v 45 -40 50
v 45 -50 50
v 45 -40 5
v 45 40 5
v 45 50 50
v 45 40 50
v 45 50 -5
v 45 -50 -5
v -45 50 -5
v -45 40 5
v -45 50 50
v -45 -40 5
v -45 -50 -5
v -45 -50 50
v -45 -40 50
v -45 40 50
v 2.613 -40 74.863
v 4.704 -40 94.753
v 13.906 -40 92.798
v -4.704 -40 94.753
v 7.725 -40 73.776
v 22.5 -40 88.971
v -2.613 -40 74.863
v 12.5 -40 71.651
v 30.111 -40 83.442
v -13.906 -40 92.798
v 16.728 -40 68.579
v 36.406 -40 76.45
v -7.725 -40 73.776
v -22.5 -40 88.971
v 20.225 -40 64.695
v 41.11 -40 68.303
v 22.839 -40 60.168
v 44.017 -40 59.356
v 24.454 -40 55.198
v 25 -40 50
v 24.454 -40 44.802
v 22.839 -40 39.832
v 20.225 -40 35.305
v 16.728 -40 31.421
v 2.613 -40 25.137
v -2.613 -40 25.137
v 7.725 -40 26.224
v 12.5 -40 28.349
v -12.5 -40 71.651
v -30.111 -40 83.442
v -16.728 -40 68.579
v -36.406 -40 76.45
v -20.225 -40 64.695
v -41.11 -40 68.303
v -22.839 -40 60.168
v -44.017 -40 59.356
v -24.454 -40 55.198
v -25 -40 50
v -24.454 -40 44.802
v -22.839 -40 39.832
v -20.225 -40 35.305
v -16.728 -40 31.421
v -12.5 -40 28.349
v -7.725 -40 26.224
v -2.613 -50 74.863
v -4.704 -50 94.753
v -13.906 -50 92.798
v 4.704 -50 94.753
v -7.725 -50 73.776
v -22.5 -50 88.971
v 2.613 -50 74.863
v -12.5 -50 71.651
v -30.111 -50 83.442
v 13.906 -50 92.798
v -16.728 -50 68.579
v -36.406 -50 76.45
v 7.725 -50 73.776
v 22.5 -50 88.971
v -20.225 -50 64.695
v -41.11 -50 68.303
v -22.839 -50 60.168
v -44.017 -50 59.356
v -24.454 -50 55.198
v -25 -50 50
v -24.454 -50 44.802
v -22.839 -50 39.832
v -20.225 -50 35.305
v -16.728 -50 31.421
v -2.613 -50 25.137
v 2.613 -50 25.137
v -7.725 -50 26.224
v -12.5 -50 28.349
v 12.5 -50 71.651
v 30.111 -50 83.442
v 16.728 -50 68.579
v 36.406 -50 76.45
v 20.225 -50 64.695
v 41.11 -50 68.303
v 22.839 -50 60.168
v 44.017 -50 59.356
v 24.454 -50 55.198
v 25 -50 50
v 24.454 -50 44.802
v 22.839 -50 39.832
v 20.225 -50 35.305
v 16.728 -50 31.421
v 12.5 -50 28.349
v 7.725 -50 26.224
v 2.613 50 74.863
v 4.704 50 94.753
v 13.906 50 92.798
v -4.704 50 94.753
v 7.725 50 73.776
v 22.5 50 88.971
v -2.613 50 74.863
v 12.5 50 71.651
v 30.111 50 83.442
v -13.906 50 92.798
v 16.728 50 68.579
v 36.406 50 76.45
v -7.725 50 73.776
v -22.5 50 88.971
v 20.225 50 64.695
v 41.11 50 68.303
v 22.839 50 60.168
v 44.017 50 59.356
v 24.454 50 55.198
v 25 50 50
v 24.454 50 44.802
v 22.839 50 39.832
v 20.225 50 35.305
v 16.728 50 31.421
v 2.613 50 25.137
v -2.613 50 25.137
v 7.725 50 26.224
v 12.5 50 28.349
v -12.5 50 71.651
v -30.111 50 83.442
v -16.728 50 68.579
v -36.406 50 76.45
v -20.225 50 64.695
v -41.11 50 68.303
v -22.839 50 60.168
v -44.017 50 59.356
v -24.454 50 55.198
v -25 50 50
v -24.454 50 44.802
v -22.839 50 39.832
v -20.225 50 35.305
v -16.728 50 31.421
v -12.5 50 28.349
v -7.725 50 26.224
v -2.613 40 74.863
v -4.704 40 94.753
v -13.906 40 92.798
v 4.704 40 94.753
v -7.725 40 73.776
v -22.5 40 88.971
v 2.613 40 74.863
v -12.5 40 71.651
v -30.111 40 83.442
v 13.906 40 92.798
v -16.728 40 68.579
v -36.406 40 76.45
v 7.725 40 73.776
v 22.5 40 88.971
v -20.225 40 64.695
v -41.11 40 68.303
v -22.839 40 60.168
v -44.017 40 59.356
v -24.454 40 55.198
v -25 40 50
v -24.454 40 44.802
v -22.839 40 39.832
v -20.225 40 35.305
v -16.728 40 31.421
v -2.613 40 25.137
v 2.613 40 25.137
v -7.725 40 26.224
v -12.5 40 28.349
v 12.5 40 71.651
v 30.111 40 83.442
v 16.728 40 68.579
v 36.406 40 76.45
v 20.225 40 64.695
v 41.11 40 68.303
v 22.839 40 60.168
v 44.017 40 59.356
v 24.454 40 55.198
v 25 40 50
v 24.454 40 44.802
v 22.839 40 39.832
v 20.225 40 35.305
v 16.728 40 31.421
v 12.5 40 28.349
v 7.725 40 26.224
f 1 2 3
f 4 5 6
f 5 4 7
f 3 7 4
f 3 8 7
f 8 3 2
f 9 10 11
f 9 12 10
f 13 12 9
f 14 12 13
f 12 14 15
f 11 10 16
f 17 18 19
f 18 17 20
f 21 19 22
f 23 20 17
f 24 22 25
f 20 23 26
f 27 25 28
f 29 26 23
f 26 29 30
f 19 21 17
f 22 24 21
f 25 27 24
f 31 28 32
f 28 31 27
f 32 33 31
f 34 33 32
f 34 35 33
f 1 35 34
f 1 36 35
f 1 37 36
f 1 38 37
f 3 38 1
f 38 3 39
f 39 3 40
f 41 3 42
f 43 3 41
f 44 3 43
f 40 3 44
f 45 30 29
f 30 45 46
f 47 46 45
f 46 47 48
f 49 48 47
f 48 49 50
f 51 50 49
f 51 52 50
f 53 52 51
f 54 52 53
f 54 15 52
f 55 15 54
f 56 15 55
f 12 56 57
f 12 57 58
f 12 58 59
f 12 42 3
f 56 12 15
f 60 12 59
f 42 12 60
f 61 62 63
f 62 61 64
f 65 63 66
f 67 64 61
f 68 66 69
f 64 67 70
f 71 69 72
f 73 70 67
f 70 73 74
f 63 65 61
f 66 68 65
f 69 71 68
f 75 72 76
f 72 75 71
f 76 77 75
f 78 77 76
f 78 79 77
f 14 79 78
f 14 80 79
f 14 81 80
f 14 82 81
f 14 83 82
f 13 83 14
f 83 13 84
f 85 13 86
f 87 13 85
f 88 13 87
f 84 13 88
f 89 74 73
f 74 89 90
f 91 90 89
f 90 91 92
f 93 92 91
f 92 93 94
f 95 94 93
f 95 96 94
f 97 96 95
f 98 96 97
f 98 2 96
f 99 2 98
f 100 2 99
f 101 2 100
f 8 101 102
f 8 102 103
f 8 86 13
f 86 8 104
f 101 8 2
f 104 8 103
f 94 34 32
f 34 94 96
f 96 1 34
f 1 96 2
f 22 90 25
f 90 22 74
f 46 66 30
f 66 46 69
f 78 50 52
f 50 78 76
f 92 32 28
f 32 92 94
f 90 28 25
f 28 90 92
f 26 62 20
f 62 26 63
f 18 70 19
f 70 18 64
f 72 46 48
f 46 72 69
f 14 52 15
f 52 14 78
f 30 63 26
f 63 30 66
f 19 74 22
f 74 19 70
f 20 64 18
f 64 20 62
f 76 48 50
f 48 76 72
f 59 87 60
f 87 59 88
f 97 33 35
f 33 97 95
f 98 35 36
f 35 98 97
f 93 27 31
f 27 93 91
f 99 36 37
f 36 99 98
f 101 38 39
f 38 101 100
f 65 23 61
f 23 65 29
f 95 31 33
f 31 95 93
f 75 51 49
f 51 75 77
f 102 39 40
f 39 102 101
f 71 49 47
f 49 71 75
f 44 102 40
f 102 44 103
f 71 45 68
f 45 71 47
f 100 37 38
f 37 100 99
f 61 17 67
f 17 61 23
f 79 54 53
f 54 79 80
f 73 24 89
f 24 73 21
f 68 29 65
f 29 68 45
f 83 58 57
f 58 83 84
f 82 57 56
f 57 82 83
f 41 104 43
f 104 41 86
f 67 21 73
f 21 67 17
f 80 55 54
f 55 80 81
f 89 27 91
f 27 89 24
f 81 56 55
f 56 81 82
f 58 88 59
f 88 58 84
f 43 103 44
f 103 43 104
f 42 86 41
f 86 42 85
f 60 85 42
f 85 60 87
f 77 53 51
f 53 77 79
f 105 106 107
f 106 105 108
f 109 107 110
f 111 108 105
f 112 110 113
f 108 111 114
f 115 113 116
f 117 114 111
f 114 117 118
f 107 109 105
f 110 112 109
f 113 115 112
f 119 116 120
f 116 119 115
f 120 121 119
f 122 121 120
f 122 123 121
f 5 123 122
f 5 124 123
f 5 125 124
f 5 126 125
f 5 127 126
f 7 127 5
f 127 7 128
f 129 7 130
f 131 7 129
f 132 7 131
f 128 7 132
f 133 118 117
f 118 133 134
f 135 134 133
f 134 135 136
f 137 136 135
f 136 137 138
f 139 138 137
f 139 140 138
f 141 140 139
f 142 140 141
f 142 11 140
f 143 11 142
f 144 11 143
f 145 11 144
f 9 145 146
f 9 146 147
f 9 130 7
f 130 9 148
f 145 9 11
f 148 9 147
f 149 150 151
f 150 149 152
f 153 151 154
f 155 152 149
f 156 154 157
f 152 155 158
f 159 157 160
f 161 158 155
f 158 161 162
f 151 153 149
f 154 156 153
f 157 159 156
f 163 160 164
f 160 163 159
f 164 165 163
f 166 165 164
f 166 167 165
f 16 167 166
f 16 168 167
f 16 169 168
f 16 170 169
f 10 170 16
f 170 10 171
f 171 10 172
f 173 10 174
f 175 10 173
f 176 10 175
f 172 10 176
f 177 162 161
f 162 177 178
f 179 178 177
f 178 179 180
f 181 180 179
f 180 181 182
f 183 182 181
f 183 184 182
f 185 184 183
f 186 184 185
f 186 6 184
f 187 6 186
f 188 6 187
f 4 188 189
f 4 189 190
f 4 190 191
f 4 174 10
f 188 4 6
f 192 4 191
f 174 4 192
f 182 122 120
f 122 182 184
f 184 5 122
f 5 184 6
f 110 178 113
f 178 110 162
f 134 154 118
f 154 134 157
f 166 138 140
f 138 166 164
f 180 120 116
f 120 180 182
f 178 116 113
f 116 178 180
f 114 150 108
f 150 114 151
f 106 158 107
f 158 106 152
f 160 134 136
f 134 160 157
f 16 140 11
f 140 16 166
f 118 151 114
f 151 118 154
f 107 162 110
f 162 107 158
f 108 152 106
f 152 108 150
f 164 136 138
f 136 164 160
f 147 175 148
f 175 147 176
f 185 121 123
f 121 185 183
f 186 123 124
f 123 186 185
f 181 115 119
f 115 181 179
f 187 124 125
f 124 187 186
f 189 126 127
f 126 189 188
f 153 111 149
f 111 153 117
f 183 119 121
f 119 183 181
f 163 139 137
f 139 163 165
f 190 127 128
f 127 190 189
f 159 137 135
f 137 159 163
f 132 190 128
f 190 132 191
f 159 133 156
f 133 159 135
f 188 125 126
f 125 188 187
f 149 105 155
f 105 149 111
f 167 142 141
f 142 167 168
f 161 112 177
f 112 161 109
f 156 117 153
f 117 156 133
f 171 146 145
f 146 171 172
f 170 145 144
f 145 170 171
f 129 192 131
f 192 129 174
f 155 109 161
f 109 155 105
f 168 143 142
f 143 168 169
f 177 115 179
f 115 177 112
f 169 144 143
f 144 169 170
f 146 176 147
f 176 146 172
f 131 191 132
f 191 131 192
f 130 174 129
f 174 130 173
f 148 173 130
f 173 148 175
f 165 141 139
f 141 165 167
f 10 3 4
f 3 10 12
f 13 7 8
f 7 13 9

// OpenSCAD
/*


*/
    
module connector_01(a,b,c,d,e){
    module bb_02(){
        module bb_01(){
        color("lime")translate([0,0,-c/2])cube ([a,b,c], center=    true);
        rotate([90,0,0])cylinder(d=a,h=b, center=true);
        }
    
    difference(){
        bb_01();
        rotate([90,0,0])cylinder(d=d,h=b+b, center=true);
        }
    }
    
    cube ([a,e,b], center=true);
    translate([0,-e/2+b/2,c]) bb_02();
    translate([0,e/2-b/2,c]) bb_02();
}

//translate([0,0,210])
color("red")connector_01(
90,// a = connector widthness
10,// b = connector thickness
50,// c = height of the cube *[]this needs to be improved
50,// d = hole
100// e = depth
); 
